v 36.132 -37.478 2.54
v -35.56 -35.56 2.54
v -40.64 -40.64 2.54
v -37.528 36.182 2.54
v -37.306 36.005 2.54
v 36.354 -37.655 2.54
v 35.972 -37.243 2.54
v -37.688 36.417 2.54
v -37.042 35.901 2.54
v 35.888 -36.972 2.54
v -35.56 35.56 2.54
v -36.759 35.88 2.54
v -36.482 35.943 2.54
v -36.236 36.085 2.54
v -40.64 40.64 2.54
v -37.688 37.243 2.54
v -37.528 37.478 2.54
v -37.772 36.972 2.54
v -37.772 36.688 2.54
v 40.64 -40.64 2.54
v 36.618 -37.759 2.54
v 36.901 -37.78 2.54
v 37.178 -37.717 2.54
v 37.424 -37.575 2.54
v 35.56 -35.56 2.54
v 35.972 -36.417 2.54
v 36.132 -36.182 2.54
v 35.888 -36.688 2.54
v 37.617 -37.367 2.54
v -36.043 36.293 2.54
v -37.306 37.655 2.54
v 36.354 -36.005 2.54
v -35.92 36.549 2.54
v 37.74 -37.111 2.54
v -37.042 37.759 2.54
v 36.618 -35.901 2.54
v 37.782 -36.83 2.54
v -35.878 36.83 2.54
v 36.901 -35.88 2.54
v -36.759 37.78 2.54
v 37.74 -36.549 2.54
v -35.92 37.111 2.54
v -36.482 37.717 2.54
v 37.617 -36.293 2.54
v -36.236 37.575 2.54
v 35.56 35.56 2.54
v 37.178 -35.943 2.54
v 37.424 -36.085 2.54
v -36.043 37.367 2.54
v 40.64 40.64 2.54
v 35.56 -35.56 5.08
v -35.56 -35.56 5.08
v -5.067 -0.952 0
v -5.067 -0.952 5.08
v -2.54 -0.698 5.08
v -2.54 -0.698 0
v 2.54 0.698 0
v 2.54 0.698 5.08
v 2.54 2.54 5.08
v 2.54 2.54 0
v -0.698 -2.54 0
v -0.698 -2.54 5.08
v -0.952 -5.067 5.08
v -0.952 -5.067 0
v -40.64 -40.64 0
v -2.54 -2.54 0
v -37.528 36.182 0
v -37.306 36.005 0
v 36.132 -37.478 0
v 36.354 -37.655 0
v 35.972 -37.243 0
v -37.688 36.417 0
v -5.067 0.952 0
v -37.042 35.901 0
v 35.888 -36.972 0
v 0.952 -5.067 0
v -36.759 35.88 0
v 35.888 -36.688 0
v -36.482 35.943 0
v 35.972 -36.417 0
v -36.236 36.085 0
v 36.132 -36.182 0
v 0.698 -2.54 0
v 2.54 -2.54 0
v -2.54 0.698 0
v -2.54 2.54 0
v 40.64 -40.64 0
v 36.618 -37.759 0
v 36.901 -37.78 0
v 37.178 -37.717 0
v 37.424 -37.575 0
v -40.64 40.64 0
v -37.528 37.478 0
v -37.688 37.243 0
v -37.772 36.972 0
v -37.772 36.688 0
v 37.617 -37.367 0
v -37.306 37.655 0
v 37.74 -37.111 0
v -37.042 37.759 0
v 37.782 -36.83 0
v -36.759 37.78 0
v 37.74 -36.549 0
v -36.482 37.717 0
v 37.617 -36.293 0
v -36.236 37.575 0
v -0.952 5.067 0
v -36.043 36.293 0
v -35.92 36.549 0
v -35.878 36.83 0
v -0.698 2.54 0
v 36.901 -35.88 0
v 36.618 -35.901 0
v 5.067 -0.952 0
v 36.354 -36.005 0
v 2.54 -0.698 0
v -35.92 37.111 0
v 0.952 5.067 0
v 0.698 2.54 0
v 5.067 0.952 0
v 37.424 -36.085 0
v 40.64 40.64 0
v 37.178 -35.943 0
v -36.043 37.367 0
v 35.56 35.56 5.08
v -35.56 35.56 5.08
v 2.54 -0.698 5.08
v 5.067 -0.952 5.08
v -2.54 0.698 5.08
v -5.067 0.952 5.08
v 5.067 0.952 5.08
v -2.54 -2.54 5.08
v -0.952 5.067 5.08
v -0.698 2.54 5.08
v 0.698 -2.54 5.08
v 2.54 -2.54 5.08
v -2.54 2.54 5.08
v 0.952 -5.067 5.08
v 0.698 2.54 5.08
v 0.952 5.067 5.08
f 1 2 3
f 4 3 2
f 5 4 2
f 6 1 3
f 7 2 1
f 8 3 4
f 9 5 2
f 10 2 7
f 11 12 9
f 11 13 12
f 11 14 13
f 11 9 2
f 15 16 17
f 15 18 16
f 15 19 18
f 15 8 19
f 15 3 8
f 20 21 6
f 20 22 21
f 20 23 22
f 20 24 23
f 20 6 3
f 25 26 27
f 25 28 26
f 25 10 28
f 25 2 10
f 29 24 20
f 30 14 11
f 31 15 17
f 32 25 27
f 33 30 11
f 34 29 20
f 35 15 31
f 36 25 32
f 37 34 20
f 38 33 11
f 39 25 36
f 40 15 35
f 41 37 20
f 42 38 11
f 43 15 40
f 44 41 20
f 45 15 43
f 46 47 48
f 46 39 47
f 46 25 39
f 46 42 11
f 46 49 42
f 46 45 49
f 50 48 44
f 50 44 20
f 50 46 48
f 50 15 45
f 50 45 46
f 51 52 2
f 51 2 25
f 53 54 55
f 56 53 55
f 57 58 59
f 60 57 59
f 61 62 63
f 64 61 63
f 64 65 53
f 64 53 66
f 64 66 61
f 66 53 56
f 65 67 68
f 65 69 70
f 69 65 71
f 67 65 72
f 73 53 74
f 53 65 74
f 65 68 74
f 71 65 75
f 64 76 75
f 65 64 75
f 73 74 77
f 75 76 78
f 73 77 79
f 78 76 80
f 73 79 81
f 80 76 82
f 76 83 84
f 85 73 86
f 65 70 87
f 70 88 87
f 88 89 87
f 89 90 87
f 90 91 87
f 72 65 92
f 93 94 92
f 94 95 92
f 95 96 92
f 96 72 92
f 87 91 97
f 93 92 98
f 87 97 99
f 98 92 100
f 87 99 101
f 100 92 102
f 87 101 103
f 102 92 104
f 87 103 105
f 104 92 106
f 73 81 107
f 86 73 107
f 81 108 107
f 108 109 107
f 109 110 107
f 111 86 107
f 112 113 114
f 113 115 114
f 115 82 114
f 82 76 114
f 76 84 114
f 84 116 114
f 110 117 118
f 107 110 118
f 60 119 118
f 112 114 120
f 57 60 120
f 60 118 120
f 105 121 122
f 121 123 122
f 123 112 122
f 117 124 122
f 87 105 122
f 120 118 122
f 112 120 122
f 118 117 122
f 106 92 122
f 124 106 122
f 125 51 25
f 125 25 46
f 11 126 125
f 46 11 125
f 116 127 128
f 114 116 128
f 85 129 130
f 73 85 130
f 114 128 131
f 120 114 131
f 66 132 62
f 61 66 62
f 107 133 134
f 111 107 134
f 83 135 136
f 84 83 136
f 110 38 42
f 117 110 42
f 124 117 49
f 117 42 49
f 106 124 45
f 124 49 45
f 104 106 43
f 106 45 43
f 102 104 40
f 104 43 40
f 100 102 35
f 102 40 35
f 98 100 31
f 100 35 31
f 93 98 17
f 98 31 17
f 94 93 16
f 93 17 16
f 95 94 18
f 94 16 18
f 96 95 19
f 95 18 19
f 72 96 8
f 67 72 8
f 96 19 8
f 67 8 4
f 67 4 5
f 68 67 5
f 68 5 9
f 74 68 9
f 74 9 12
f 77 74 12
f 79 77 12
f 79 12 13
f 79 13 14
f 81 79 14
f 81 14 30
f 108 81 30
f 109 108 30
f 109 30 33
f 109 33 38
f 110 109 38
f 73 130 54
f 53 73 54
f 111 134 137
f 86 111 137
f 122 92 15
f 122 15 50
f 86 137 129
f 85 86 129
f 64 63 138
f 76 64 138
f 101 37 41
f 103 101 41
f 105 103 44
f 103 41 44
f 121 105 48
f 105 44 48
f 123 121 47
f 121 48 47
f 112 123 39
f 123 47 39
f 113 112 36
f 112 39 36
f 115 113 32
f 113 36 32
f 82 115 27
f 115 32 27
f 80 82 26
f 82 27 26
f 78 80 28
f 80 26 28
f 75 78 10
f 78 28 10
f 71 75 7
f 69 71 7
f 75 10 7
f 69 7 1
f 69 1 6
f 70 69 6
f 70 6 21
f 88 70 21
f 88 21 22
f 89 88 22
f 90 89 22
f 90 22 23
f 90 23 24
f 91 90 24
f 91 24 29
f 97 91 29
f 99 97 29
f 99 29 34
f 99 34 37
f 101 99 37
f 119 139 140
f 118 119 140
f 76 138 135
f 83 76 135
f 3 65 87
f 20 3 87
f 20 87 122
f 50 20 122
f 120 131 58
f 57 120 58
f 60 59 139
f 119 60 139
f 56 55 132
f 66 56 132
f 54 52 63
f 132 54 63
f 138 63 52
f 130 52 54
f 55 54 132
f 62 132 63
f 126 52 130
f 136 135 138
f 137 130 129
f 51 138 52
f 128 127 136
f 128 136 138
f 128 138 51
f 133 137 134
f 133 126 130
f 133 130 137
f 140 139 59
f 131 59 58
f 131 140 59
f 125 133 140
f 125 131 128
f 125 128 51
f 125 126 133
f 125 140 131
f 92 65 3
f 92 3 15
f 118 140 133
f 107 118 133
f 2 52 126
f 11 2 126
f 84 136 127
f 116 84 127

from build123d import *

# Parameters (mm, degrees)
F0_W      = 81.28
F0_H      = 81.28
F1_DEPTH  = 38.1
F2_W      = 81.28
F2_H      = 81.28
F2_W_2    = 71.12
F2_H_2    = 71.12
F3_DEPTH  = 35.56
F4_W      = 76.2
F4_H      = 76.2
F5_DEPTH  = 33.02
F7_DEPTH  = 25.4
F8_R      = 0.9525
F9_DEPTH  = 25.4
F10_R     = 0.9525
F11_DEPTH = 25.4


with BuildPart() as f1:
    # F0 (on Top) → F1 (new body)
    with BuildSketch(Plane.XY):
        Rectangle(F0_W, F0_H)
    extrude(amount=F1_DEPTH)

    # F2 (on face) → F3 (cut)
    with BuildSketch(Plane.XY.offset(38.1)):
        Rectangle(F2_W, F2_H)
        Rectangle(F2_W_2, F2_H_2, mode=Mode.SUBTRACT)
    extrude(amount=-F3_DEPTH, mode=Mode.SUBTRACT)

    # F4 (on face) → F5 (cut)
    with BuildSketch(Plane.XY.offset(38.1)):
        Rectangle(F4_W, F4_H)
    extrude(amount=-F5_DEPTH, mode=Mode.SUBTRACT)

    # F6 (on face) → F7 (cut)
    with BuildSketch(Plane.XY.offset(5.08)):
        Polygon((-0.9525, -5.067268), (0.9525, -5.067268), (0.6985, -2.54), (2.54, -2.54), (2.54, -0.6985), (5.067268, -0.9525), (5.067268, 0.9525), (2.54, 0.6985), (2.54, 2.54), (0.6985, 2.54), (0.9525, 5.067268), (-0.9525, 5.067268), (-0.6985, 2.54), (-2.54, 2.54), (-2.54, 0.6985), (-5.067268, 0.9525), (-5.067268, -0.9525), (-2.54, -0.6985), (-2.54, -2.54), (-0.6985, -2.54), align=None)
    extrude(amount=-F7_DEPTH, mode=Mode.SUBTRACT)

    # F8 (on face) → F9 (cut)
    with BuildSketch(Plane.XY.offset(2.54)):
        with Locations((-36.83, 36.83)):
            Circle(F8_R)
    extrude(amount=-F9_DEPTH, mode=Mode.SUBTRACT)

    # F10 (on face) → F11 (cut)
    with BuildSketch(Plane.XY.offset(2.54)):
        with Locations((36.83, -36.83)):
            Circle(F10_R)
    extrude(amount=-F11_DEPTH, mode=Mode.SUBTRACT)


solid = f1.part
